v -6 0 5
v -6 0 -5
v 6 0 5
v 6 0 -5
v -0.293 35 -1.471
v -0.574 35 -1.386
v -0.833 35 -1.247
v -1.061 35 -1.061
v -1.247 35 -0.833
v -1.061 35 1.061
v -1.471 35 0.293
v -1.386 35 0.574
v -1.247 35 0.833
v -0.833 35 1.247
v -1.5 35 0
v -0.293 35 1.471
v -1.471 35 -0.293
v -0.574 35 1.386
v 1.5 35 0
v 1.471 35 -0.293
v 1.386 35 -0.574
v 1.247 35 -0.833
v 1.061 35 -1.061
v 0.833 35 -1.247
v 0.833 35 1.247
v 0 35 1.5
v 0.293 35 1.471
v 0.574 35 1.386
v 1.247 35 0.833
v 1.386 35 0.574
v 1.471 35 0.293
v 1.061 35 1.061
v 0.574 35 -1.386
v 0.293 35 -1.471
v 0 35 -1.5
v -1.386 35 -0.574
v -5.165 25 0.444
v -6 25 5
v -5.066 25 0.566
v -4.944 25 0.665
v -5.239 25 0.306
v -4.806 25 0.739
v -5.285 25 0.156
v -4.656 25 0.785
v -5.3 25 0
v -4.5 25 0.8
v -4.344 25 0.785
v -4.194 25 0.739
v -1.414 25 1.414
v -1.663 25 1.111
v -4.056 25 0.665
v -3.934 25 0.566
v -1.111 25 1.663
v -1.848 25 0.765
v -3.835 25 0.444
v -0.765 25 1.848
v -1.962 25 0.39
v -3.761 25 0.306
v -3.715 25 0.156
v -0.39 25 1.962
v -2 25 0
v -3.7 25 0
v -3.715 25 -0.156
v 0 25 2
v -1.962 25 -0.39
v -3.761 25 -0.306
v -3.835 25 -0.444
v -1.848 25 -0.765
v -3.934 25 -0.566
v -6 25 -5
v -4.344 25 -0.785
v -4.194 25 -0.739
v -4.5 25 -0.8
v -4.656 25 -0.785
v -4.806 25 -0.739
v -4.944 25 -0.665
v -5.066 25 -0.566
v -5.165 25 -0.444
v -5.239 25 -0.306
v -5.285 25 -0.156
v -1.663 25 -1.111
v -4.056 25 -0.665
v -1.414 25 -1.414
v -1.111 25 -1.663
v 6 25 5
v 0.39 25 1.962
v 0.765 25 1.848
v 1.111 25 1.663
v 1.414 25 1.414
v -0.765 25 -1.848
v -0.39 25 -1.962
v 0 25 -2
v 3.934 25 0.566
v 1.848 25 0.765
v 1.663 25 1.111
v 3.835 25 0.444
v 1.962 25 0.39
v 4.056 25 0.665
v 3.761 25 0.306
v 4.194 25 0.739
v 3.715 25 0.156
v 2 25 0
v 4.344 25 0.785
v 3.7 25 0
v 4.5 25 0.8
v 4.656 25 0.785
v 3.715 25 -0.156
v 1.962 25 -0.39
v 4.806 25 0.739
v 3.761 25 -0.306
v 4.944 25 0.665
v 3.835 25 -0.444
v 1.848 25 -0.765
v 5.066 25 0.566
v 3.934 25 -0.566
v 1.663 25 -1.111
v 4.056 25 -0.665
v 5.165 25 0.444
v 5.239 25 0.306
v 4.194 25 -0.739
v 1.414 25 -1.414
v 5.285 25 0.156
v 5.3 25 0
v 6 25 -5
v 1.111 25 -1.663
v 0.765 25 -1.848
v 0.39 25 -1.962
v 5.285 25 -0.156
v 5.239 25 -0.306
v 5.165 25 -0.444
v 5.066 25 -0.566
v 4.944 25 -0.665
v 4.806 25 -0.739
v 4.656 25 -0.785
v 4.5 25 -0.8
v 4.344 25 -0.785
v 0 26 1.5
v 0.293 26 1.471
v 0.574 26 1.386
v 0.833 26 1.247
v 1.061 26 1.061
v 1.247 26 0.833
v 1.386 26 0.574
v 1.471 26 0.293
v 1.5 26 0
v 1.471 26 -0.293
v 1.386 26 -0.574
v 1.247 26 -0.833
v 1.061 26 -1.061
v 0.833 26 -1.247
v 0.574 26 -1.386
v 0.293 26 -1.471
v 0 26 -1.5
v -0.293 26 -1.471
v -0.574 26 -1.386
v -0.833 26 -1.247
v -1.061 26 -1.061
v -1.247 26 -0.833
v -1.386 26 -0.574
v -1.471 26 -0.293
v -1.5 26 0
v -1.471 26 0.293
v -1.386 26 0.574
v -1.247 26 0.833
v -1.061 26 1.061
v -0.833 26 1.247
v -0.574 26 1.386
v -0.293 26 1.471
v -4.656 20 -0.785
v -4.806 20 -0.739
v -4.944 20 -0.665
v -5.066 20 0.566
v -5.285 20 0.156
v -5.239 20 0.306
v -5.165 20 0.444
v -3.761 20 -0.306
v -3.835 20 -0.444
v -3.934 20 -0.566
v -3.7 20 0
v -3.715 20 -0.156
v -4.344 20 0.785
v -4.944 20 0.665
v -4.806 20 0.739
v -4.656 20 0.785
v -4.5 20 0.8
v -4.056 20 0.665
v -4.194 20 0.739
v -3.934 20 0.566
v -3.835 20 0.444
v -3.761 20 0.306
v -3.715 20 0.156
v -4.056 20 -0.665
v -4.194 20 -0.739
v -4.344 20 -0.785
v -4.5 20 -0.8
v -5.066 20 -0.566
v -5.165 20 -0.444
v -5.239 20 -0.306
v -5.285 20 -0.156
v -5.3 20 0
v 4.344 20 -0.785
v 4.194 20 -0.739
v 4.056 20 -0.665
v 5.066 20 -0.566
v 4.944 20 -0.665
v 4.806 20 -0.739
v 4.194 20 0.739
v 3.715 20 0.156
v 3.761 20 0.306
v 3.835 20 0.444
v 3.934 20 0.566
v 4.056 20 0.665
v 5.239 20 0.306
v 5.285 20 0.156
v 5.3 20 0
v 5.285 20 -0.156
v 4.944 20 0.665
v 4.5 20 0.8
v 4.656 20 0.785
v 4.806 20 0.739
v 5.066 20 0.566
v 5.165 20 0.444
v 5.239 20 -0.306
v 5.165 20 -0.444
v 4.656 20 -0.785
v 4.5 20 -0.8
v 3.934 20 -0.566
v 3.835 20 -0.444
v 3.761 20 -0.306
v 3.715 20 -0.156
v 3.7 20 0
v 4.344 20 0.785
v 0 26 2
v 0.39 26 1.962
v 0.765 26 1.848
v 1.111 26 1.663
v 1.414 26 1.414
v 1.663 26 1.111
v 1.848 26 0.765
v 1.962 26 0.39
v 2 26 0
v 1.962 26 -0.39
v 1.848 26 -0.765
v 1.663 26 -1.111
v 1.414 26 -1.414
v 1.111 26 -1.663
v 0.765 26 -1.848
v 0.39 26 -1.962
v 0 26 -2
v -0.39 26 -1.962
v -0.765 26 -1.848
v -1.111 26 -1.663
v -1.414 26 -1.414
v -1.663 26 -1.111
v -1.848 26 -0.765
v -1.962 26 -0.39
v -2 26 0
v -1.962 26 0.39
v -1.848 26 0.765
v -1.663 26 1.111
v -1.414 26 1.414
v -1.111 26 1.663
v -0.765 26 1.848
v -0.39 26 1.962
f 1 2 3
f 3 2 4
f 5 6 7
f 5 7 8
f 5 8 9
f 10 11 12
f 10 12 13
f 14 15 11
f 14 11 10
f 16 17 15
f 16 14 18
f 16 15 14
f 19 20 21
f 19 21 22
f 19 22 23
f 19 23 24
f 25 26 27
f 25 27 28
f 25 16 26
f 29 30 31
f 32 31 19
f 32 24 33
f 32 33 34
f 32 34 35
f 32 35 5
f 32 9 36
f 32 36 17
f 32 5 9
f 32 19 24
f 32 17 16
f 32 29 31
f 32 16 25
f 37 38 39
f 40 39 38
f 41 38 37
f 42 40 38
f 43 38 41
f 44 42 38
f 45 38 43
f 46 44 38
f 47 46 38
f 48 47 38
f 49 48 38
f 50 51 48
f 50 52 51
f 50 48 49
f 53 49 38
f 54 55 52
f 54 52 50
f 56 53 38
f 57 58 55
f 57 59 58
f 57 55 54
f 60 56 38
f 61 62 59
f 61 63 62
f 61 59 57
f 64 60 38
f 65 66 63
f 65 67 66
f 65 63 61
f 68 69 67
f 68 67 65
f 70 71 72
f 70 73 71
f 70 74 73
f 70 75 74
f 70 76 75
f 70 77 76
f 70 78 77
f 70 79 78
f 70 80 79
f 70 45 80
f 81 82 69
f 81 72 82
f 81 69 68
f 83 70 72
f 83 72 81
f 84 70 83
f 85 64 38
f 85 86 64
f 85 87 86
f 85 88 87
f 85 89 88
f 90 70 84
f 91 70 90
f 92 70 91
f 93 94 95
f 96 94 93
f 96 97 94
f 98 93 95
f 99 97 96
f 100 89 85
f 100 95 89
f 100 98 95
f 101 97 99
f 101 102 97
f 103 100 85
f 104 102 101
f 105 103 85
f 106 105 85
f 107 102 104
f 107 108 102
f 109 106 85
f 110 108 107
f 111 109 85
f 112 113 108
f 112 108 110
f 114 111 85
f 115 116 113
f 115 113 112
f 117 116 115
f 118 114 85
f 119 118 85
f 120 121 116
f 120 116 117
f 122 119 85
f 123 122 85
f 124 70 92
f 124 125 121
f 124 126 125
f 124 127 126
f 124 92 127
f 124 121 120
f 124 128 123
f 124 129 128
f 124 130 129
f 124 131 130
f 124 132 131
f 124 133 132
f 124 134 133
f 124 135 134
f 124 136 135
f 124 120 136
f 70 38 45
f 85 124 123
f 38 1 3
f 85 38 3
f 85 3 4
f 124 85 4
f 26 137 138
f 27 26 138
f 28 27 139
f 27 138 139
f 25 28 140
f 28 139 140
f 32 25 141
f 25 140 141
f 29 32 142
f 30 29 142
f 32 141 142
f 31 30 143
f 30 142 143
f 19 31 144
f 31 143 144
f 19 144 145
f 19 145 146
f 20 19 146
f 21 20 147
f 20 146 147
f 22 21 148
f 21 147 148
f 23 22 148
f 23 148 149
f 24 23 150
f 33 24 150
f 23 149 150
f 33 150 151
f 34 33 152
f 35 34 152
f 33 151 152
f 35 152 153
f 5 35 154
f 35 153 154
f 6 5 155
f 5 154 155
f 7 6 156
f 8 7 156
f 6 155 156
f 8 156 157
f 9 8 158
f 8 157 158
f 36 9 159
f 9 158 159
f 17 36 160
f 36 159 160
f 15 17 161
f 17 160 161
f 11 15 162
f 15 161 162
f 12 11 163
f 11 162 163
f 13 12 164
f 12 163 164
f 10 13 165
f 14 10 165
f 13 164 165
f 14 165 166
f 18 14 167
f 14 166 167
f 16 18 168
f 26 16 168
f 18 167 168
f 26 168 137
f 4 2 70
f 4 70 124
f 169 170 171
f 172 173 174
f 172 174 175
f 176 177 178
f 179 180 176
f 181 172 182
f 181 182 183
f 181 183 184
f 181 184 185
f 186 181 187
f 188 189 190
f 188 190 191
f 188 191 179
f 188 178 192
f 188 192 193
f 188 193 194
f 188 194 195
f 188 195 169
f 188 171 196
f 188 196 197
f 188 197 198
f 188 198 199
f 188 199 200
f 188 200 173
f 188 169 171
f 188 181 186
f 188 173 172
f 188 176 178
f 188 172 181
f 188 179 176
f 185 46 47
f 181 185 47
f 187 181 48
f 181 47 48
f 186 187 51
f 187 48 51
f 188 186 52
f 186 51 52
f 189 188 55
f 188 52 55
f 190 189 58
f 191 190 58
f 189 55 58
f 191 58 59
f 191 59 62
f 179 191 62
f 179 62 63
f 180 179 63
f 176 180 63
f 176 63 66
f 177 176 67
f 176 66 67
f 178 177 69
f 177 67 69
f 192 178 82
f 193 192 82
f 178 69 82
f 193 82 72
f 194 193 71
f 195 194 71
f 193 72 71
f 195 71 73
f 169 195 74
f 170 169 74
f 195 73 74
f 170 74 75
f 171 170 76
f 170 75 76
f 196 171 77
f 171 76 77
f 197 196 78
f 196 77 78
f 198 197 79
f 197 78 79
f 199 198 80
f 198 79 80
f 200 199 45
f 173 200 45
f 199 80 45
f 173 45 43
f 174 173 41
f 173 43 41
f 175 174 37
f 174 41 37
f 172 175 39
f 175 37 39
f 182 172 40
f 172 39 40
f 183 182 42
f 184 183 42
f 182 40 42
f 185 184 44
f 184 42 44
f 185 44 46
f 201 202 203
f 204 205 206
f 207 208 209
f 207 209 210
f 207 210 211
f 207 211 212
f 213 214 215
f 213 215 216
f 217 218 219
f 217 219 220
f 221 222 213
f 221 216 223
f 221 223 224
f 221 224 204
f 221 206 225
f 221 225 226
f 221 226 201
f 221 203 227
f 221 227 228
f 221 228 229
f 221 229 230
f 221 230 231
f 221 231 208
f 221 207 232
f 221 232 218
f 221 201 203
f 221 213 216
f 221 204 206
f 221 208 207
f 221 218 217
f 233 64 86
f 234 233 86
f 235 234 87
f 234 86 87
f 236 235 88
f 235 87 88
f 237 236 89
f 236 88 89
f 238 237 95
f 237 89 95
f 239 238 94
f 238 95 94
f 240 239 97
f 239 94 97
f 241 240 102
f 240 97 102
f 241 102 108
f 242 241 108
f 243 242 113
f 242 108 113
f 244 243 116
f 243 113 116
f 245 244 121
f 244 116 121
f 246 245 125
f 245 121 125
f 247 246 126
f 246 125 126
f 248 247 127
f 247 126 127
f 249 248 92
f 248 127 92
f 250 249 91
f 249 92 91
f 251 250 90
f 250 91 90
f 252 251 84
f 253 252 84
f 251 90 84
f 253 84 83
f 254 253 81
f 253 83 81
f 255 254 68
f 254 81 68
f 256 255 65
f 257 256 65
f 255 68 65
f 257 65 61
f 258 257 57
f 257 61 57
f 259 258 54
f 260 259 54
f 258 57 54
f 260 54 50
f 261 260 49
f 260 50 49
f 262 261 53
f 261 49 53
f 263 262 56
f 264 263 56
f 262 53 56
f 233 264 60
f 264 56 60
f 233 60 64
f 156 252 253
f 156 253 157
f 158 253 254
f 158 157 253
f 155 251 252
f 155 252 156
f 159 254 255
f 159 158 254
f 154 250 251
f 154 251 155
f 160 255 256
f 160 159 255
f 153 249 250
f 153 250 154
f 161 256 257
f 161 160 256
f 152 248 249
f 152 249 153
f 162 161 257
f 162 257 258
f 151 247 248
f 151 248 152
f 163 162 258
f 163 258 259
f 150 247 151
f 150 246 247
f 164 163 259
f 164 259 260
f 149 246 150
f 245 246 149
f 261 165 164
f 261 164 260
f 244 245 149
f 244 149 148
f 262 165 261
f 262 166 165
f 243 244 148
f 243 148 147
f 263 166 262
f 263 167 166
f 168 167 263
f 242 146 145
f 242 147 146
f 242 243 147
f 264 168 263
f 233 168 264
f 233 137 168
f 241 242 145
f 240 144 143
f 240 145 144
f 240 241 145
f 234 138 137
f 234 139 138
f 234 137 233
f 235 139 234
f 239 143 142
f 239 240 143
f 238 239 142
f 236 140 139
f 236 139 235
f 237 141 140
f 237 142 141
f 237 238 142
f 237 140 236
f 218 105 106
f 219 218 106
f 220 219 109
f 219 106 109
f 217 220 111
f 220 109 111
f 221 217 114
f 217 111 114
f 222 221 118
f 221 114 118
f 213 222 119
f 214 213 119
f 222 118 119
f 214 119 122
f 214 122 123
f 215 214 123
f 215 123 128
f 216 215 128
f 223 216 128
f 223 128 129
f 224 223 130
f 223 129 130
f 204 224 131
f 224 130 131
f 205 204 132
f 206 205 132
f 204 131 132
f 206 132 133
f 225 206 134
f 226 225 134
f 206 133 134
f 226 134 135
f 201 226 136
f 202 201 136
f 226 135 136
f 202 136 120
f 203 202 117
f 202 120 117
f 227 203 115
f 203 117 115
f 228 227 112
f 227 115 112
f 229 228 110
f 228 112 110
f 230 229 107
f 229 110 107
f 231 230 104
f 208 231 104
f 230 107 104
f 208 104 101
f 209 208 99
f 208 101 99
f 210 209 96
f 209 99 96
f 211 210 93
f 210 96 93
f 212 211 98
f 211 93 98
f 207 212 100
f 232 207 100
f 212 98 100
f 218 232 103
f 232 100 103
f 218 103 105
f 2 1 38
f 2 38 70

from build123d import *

# Parameters (mm, degrees)
SKETCH_1_W          = 12
SKETCH_1_H          = 10
EXTRUDE_1_DEPTH     = 25
SKETCH_2_R          = 2
EXTRUDE_2_DEPTH     = 1
SKETCH_3_R          = 1.5
EXTRUDE_3_DEPTH     = 9
SKETCH_4_R          = 0.8
CUT_EXTRUDE_1_DEPTH = 5


with BuildPart() as part:
    # 草图1 → 凸台-拉伸1 (new body)
    with BuildSketch(Plane(origin=(0, 0, 0), x_dir=(1, 0, 0), z_dir=(0, 1, 0))):
        Rectangle(SKETCH_1_W, SKETCH_1_H)
    extrude(amount=EXTRUDE_1_DEPTH)

    # 草图2 → 凸台-拉伸2 (add)
    with BuildSketch(Plane(origin=(0, 25, 0), x_dir=(1, 0, 0), z_dir=(0, 1, 0))):
        with Locations(Location((0, 0, 0), (0, 0, 270))):
            Circle(SKETCH_2_R)
    extrude(amount=EXTRUDE_2_DEPTH)

    # 草图3 → 凸台-拉伸3 (add)
    with BuildSketch(Plane(origin=(0, 26, 0), x_dir=(1, 0, 0), z_dir=(0, 1, 0))):
        with Locations(Location((0, 0, 0), (0, 0, 270))):
            Circle(SKETCH_3_R)
    extrude(amount=EXTRUDE_3_DEPTH)

    # 草图4 → 切除-拉伸1 (cut)
    with BuildSketch(Plane(origin=(0, 25, 0), x_dir=(1, 0, 0), z_dir=(0, 1, 0))):
        with Locations(Location((-4.5, 0, 0), (0, 0, 270))):
            Circle(SKETCH_4_R)
        with Locations(Location((4.5, 0, 0), (0, 0, 270))):
            Circle(SKETCH_4_R)
    extrude(amount=-CUT_EXTRUDE_1_DEPTH, mode=Mode.SUBTRACT)


solid = part.part
